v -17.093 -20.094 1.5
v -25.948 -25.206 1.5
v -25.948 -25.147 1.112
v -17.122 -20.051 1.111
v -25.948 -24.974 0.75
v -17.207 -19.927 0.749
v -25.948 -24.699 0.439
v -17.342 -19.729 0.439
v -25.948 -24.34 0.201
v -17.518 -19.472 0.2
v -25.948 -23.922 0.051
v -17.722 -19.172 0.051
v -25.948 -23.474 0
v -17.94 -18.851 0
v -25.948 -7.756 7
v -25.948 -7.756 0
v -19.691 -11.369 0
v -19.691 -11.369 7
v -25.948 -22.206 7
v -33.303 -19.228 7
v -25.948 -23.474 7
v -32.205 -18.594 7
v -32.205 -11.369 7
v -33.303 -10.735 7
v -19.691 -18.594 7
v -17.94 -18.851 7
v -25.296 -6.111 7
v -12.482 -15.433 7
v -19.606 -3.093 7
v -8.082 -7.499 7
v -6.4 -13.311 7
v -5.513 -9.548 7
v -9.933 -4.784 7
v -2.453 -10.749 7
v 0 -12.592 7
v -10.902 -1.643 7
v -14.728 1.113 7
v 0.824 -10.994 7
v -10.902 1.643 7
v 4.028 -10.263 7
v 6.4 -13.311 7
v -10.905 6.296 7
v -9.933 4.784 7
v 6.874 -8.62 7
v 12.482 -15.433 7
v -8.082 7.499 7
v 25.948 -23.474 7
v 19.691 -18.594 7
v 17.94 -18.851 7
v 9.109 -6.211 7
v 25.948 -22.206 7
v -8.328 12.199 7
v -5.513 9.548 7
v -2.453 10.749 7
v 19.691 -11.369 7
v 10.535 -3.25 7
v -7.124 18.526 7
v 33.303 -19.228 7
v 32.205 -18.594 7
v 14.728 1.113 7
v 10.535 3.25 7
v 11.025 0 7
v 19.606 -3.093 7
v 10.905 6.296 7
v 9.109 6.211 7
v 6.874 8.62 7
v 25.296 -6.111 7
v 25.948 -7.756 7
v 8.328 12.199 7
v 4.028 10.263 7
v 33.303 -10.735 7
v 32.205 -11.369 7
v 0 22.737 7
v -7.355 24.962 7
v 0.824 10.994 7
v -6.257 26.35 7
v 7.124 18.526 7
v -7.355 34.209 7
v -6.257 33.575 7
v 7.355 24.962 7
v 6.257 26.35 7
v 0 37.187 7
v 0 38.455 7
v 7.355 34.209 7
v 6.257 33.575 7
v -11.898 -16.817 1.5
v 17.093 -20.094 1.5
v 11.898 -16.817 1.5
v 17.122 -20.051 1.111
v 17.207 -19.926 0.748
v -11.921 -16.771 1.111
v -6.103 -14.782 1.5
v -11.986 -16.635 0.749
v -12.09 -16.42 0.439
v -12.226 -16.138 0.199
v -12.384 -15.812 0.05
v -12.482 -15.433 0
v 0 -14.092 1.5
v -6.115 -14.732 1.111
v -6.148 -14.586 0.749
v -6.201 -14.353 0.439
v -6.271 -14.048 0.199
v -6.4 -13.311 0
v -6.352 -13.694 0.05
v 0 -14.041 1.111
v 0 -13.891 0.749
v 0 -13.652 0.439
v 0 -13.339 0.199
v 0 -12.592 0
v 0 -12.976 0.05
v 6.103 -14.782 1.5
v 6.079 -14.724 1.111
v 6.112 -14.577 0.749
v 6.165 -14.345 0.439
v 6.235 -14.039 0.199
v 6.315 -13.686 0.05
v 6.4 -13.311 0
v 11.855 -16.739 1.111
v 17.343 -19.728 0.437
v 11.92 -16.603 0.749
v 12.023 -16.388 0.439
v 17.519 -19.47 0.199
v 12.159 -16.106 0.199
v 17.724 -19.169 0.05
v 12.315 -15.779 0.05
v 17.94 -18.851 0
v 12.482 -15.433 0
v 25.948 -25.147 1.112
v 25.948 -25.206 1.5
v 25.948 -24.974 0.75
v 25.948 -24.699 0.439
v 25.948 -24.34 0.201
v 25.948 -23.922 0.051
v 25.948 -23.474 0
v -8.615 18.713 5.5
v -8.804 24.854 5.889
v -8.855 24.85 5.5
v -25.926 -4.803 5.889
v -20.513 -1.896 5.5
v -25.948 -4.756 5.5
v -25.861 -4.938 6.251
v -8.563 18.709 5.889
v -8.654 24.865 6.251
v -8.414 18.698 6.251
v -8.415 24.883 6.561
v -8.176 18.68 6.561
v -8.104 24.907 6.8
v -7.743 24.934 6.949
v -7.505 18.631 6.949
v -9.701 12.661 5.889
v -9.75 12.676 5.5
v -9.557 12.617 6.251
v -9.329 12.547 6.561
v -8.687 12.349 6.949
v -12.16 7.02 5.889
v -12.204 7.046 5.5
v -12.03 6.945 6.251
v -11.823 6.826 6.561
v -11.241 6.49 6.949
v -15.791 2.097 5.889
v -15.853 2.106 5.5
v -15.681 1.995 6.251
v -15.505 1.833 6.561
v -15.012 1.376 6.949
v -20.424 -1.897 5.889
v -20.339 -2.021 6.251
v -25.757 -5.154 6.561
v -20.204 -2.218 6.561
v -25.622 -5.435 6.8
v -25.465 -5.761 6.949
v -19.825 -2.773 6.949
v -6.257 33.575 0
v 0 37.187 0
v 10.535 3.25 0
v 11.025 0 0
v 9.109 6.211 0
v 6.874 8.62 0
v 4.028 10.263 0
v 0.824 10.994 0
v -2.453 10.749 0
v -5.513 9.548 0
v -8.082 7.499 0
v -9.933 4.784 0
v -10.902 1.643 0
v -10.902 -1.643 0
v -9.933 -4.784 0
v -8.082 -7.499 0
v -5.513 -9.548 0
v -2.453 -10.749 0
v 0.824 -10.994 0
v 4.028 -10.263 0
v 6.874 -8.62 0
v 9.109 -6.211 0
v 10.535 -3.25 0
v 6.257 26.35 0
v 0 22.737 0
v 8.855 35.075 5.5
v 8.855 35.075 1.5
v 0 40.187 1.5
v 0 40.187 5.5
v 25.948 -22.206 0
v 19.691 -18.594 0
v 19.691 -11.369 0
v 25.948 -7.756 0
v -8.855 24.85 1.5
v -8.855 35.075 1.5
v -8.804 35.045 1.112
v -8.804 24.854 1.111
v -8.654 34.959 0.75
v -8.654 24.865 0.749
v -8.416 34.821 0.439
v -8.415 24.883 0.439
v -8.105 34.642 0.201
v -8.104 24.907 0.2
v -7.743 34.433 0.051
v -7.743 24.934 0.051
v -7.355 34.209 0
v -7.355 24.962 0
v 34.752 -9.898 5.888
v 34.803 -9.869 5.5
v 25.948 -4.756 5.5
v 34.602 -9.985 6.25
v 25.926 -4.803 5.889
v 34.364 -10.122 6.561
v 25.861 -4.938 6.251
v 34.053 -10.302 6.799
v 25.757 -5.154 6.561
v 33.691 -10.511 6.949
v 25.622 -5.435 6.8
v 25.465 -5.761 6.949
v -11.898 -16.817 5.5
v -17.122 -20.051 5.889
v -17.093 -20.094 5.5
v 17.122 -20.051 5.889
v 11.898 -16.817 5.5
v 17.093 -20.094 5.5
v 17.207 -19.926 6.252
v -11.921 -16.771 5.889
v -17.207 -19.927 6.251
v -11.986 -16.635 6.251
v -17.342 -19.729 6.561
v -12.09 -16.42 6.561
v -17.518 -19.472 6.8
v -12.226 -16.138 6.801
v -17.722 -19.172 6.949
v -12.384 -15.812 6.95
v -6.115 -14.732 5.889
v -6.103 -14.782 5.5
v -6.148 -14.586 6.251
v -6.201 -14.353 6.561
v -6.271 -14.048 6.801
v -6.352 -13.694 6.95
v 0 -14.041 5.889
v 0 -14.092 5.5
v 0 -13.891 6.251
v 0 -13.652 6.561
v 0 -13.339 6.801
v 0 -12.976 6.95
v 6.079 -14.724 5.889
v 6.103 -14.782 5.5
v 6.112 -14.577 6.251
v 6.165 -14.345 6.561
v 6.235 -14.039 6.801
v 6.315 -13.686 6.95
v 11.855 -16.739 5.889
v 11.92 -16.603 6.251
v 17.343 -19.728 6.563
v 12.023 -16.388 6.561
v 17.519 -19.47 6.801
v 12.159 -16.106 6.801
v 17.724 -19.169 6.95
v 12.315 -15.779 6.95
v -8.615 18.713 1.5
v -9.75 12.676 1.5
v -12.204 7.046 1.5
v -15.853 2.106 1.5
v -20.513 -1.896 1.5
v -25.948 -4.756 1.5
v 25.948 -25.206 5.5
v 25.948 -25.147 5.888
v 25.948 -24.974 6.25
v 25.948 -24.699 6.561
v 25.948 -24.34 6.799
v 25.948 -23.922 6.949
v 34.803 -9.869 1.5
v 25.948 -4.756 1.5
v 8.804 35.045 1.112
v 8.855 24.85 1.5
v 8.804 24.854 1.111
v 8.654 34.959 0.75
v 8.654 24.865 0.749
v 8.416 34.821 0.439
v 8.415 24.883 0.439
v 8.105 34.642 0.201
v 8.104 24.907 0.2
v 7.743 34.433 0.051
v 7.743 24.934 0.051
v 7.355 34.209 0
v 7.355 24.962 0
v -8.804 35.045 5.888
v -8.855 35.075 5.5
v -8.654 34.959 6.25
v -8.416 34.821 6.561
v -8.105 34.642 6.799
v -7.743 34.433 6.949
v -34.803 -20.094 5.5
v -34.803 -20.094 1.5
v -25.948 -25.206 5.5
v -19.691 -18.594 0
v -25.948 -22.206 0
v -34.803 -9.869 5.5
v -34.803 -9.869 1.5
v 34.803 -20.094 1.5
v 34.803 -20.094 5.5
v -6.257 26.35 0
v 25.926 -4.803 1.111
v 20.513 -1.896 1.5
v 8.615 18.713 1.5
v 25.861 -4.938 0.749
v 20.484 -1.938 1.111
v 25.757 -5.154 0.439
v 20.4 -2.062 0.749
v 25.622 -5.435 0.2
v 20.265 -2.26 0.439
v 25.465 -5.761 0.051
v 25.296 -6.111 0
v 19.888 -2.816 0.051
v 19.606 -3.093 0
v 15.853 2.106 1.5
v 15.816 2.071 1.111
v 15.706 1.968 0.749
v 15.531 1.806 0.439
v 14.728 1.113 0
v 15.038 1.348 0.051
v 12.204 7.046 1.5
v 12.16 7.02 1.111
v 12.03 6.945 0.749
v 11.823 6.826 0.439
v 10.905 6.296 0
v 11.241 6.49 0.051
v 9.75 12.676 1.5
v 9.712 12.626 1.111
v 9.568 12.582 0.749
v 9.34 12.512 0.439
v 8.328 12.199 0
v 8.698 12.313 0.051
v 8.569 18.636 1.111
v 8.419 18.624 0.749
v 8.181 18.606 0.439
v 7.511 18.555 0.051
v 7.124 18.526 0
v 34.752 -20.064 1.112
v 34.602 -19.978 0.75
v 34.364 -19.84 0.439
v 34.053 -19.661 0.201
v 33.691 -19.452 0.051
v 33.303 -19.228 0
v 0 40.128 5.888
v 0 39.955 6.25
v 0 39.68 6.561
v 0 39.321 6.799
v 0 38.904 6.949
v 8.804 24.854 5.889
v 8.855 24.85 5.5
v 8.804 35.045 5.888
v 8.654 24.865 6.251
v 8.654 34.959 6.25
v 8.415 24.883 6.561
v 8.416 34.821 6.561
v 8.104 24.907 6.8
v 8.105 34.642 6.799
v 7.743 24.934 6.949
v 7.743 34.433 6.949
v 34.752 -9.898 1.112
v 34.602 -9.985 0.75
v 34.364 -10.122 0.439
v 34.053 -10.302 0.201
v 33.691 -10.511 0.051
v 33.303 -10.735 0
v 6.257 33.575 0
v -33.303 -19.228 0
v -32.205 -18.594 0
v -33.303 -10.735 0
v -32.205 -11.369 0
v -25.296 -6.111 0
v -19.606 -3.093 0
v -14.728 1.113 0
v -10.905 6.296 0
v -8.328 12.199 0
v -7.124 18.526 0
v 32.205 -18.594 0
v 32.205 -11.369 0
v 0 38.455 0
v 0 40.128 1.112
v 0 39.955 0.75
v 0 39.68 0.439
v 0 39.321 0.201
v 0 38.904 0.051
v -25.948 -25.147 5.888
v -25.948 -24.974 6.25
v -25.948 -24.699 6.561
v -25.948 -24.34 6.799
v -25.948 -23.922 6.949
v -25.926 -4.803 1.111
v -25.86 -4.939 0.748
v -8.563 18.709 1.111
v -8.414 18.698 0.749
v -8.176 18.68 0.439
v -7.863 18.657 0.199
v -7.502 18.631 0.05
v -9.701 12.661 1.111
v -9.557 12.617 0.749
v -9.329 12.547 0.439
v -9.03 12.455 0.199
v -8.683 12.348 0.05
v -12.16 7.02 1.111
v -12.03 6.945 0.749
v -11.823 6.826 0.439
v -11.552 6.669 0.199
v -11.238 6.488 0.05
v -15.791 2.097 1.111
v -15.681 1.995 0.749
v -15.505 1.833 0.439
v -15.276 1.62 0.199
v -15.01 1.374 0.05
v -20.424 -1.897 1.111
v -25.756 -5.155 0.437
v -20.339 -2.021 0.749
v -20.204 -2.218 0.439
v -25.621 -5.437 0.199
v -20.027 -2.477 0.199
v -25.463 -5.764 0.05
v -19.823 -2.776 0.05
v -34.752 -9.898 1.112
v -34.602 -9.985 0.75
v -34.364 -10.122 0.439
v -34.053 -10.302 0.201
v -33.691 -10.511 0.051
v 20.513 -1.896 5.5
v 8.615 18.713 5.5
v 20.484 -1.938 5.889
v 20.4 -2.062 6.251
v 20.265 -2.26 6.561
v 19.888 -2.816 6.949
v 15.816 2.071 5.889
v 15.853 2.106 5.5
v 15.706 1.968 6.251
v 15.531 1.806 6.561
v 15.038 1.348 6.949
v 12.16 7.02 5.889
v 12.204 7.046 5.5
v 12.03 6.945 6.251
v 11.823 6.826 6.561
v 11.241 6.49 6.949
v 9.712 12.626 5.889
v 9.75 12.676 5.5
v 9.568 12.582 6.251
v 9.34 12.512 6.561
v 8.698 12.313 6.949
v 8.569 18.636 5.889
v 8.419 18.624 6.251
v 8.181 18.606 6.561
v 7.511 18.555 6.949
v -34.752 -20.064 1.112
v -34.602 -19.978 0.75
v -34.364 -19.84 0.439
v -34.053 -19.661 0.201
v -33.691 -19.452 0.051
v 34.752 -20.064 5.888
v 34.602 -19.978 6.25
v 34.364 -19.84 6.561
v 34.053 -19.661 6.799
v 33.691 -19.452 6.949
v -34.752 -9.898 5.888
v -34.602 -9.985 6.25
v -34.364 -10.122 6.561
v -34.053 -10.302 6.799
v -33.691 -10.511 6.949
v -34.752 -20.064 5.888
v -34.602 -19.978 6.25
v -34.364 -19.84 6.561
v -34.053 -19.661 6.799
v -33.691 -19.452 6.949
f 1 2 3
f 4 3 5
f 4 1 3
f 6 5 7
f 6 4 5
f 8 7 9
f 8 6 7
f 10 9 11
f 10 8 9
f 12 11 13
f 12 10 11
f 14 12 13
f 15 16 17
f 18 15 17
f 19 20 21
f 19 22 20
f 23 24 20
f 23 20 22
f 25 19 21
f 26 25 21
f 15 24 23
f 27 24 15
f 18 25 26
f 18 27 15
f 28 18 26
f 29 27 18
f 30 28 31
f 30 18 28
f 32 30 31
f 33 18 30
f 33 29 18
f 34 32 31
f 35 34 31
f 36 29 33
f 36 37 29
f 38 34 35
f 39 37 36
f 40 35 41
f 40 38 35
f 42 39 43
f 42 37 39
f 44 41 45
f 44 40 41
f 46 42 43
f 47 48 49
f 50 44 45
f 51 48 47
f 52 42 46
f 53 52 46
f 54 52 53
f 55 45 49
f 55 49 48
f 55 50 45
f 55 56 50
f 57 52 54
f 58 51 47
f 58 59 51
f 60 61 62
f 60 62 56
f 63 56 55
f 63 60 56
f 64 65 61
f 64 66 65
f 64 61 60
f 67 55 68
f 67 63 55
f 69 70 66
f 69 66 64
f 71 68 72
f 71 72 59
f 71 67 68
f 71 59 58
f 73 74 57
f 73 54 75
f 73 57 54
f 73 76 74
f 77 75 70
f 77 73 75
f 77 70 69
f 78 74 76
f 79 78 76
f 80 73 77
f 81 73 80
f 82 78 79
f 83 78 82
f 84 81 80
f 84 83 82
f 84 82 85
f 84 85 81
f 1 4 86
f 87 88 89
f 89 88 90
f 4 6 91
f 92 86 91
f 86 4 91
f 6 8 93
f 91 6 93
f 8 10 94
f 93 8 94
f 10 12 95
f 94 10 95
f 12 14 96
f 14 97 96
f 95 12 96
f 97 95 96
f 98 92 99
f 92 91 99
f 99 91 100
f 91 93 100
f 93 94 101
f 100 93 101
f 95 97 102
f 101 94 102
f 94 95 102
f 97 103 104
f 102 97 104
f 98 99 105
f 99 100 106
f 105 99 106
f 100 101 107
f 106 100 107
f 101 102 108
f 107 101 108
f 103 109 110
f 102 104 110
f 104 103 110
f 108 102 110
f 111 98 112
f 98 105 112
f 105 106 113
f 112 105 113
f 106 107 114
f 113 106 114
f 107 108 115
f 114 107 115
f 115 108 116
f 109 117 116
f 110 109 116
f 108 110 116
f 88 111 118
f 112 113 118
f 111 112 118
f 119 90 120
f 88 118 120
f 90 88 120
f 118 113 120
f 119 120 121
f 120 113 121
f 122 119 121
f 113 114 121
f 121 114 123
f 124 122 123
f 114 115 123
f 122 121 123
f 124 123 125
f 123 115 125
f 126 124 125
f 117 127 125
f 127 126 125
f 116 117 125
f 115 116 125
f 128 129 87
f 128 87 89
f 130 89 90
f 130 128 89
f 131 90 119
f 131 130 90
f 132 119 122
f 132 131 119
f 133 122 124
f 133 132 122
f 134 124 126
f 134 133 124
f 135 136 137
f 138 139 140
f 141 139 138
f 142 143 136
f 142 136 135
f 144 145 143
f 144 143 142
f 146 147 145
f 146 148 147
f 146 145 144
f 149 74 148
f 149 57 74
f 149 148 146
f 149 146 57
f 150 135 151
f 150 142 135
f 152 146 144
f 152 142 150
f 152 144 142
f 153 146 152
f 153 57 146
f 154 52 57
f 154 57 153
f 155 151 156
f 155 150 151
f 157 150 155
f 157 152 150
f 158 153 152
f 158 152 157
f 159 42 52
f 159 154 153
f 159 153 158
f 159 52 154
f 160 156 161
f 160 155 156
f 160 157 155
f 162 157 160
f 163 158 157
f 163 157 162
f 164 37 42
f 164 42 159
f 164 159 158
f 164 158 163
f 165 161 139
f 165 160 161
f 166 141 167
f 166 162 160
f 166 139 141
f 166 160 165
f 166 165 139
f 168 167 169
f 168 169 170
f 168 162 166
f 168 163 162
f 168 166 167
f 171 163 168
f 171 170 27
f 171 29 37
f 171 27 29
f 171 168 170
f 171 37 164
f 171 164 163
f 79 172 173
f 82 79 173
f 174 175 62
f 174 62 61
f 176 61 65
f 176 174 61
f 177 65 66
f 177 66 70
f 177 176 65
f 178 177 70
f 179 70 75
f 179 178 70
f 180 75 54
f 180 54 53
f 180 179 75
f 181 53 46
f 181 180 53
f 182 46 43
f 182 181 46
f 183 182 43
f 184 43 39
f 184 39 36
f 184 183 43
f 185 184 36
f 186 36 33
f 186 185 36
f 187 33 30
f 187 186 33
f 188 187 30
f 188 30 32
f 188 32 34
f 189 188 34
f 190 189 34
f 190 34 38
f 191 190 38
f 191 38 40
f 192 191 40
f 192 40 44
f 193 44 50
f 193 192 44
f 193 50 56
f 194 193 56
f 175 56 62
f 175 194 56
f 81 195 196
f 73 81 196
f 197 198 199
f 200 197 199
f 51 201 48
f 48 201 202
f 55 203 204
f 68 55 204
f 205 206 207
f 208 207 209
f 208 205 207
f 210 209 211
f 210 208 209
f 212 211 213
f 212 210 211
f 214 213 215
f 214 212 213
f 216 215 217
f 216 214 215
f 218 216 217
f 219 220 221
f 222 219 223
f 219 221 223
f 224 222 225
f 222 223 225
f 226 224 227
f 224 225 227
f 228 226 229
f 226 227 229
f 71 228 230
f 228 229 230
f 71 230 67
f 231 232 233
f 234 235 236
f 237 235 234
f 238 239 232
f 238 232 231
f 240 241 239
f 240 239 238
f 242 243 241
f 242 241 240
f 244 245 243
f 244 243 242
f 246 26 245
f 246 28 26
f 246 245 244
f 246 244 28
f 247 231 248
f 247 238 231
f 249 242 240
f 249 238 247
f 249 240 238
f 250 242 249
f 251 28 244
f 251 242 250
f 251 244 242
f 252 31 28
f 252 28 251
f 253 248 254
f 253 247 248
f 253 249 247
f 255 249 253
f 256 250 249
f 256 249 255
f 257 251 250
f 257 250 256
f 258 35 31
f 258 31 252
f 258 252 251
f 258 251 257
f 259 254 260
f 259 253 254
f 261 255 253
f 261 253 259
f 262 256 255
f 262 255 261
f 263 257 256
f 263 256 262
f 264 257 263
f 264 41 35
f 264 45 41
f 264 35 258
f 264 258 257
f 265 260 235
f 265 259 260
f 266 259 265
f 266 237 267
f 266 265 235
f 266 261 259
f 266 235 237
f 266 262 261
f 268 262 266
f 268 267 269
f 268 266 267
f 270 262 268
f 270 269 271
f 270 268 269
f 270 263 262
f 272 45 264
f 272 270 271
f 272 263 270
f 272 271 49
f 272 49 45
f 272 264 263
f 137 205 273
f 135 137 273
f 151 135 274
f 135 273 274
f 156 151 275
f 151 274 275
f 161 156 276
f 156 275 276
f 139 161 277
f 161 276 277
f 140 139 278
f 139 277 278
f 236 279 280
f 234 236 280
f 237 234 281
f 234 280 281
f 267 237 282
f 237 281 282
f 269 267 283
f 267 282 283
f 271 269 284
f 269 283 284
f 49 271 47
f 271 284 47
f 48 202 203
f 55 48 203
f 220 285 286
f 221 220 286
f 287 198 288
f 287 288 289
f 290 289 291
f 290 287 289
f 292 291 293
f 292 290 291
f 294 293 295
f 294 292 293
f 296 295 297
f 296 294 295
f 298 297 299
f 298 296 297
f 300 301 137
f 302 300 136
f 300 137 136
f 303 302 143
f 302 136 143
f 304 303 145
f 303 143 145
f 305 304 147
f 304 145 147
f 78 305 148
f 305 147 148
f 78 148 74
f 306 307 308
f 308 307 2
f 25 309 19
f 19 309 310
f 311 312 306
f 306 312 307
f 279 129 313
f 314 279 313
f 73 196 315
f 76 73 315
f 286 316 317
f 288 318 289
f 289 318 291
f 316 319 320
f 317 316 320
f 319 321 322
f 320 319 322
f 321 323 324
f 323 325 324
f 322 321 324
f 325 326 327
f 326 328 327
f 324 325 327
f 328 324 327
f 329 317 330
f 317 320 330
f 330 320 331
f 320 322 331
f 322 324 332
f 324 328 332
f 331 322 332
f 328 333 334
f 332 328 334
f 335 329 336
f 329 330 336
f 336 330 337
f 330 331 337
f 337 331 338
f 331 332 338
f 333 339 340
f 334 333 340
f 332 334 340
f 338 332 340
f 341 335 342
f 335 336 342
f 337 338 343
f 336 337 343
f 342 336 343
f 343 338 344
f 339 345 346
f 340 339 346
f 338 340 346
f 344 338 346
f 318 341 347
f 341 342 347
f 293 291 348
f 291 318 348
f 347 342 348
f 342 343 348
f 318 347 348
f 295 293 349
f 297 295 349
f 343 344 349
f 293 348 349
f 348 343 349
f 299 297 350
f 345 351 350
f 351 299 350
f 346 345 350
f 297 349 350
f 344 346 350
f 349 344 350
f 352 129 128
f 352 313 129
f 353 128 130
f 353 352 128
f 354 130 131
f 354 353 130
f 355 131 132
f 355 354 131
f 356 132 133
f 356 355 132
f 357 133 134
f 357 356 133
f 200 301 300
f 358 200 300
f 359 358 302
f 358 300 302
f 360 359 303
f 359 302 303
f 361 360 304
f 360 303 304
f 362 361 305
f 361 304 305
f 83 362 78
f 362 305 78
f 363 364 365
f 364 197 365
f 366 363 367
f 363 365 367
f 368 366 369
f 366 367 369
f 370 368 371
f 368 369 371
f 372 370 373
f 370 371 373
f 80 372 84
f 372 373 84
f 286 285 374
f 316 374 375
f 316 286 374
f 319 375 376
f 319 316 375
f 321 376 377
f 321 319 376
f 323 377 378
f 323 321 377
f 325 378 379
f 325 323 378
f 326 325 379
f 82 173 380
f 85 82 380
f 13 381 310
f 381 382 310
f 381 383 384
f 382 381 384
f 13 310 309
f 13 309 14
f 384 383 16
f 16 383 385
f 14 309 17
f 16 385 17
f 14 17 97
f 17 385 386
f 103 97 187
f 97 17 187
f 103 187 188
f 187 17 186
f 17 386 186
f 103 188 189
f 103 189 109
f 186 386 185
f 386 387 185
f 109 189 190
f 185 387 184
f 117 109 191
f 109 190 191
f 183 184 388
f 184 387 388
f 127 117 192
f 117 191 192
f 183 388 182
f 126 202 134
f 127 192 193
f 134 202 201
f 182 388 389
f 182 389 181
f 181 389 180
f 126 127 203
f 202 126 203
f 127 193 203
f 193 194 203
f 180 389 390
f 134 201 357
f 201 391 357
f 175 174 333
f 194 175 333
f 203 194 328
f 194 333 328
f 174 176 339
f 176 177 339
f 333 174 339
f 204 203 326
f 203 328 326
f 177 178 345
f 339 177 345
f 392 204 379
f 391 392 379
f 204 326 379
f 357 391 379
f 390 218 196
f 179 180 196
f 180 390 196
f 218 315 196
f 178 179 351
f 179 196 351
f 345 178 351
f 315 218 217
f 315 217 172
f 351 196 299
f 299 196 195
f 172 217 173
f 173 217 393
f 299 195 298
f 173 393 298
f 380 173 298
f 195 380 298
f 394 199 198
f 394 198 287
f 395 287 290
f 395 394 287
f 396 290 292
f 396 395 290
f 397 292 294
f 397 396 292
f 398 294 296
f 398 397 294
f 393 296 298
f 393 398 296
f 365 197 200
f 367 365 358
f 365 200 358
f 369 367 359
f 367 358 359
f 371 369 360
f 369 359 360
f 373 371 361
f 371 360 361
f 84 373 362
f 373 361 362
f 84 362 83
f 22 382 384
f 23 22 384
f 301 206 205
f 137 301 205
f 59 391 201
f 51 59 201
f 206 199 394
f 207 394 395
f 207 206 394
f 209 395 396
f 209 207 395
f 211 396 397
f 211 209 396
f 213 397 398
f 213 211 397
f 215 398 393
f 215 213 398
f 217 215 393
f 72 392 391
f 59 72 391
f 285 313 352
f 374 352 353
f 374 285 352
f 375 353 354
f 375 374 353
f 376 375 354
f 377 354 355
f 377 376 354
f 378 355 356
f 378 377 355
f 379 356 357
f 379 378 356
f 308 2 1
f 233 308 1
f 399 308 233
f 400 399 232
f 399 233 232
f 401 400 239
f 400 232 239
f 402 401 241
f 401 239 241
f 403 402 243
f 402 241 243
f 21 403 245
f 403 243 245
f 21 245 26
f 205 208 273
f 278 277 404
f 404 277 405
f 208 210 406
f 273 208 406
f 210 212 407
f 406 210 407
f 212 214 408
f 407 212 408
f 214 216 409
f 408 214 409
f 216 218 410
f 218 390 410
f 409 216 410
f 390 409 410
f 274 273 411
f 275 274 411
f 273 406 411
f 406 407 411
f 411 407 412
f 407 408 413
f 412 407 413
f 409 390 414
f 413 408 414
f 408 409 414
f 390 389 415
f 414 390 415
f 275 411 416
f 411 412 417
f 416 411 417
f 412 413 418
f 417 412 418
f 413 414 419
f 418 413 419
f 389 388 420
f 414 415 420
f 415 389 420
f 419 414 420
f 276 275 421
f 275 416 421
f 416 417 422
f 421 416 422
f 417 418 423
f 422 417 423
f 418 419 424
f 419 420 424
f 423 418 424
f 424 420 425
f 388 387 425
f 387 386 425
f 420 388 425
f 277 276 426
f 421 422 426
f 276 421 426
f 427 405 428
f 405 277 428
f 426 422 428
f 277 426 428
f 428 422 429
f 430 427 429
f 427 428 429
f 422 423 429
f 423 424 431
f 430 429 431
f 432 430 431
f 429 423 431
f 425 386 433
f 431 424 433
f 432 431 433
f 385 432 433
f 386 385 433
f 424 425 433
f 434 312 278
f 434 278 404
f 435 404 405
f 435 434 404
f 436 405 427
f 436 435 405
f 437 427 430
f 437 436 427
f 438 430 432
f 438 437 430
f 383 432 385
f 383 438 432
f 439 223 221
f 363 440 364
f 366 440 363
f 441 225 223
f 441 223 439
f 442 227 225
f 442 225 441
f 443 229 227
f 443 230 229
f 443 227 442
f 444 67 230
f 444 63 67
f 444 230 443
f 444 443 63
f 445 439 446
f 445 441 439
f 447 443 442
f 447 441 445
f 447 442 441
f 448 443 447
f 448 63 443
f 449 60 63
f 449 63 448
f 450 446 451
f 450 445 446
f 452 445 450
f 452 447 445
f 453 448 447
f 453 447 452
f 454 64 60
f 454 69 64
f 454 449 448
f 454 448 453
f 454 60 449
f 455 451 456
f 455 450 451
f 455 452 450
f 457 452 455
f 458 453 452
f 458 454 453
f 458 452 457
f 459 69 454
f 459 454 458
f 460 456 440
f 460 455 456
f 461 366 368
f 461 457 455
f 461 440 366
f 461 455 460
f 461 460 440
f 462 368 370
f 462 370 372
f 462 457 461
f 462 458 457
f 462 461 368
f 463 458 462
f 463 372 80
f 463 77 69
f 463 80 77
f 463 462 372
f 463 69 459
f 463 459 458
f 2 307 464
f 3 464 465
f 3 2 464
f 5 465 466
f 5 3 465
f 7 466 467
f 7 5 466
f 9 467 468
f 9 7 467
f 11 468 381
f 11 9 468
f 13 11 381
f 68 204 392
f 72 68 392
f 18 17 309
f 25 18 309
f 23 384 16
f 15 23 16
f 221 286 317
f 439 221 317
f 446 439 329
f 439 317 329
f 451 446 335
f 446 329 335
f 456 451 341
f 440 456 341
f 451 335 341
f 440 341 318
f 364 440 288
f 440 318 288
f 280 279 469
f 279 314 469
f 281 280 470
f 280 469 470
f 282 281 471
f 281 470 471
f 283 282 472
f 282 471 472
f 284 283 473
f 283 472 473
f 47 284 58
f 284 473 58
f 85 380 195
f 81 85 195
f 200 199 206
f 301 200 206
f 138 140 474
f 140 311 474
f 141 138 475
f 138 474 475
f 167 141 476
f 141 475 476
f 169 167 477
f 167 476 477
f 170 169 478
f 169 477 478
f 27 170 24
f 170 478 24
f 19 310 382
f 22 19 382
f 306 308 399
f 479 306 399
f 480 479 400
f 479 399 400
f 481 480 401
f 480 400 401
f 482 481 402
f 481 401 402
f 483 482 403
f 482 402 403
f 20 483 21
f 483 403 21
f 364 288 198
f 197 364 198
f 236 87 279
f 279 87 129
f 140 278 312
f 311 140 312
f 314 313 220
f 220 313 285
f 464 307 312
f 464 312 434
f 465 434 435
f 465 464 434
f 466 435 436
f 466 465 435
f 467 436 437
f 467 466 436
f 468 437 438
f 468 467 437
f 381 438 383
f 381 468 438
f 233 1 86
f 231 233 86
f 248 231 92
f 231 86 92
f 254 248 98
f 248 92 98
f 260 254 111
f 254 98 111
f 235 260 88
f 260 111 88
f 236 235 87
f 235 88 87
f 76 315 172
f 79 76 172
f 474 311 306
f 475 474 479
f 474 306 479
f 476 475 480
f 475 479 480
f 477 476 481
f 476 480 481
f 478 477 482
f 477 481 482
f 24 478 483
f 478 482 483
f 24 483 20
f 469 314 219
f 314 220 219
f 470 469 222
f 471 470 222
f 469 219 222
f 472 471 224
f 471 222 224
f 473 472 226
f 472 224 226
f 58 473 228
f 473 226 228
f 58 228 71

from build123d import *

# Parameters (mm, degrees)
F0_R     = 11.025
F1_DEPTH = 7
F2_R     = 1.5


with BuildPart() as f1:
    # F0 (on Top) → F1 (new body)
    with BuildSketch(Plane.XY):
        with BuildLine():
            Line((8.85511, 24.849853), (8.85511, 35.074853))
            Line((8.85511, 35.074853), (0, 40.187353))
            Line((0, 40.187353), (-8.85511, 35.074853))
            Line((-8.85511, 35.074853), (-8.85511, 24.849853))
            ThreePointArc((-8.85511, 24.849853), (-12.204102, 7.046041), (-25.948159, -4.756177))
            Line((-25.948159, -4.756177), (-34.803269, -9.868677))
            Line((-34.803269, -9.868677), (-34.803269, -20.093677))
            Line((-34.803269, -20.093677), (-25.948159, -25.206177))
            Line((-25.948159, -25.206177), (-17.093049, -20.093677))
            ThreePointArc((-17.093049, -20.093677), (0, -14.092083), (17.093049, -20.093677))
            Line((17.093049, -20.093677), (25.948159, -25.206177))
            Line((25.948159, -25.206177), (34.803269, -20.093677))
            Line((34.803269, -20.093677), (34.803269, -9.868677))
            Line((34.803269, -9.868677), (25.948159, -4.756177))
            ThreePointArc((25.948159, -4.756177), (12.204102, 7.046041), (8.85511, 24.849853))
        make_face()
        Polygon((-32.205193, -11.368677), (-25.948159, -7.756177), (-19.691126, -11.368677), (-19.691126, -18.593677), (-25.948159, -22.206177), (-32.205193, -18.593677), align=None, mode=Mode.SUBTRACT)
        Polygon((25.948159, -22.206177), (19.691126, -18.593677), (19.691126, -11.368677), (25.948159, -7.756177), (32.205193, -11.368677), (32.205193, -18.593677), align=None, mode=Mode.SUBTRACT)
        Circle(F0_R, mode=Mode.SUBTRACT)
        Polygon((0, 37.187353), (6.257034, 33.574853), (6.257034, 26.349853), (0, 22.737353), (-6.257034, 26.349853), (-6.257034, 33.574853), align=None, mode=Mode.SUBTRACT)
    extrude(amount=F1_DEPTH)

    # F2
    f2_edges = [f1.edges().sort_by_distance(p)[0] for p in [
        (0, -14.092083, 7),
        (-21.520604, -22.649927, 7),
        (-30.375714, -22.649927, 7),
        (-34.803269, -14.981177, 7),
        (-30.375714, -7.312427, 7),
        (-12.204102, 7.046041, 7),
        (21.520604, -22.649927, 7),
        (30.375714, -22.649927, 7),
        (34.803269, -14.981177, 7),
        (30.375714, -7.312427, 7),
        (12.204102, 7.046041, 7),
        (8.85511, 29.962353, 7),
        (4.427555, 37.631103, 7),
        (-4.427555, 37.631103, 7),
        (-8.85511, 29.962353, 7),
        (0, -14.092083, 0),
        (-21.520604, -22.649927, 0),
        (-30.375714, -22.649927, 0),
        (-34.803269, -14.981177, 0),
        (-30.375714, -7.312427, 0),
        (-12.204102, 7.046041, 0),
        (-8.85511, 29.962353, 0),
        (-4.427555, 37.631103, 0),
        (4.427555, 37.631103, 0),
        (8.85511, 29.962353, 0),
        (12.204102, 7.046041, 0),
        (30.375714, -7.312427, 0),
        (34.803269, -14.981177, 0),
        (30.375714, -22.649927, 0),
        (21.520604, -22.649927, 0),
    ]]
    fillet(f2_edges, radius=F2_R)


solid = f1.part
